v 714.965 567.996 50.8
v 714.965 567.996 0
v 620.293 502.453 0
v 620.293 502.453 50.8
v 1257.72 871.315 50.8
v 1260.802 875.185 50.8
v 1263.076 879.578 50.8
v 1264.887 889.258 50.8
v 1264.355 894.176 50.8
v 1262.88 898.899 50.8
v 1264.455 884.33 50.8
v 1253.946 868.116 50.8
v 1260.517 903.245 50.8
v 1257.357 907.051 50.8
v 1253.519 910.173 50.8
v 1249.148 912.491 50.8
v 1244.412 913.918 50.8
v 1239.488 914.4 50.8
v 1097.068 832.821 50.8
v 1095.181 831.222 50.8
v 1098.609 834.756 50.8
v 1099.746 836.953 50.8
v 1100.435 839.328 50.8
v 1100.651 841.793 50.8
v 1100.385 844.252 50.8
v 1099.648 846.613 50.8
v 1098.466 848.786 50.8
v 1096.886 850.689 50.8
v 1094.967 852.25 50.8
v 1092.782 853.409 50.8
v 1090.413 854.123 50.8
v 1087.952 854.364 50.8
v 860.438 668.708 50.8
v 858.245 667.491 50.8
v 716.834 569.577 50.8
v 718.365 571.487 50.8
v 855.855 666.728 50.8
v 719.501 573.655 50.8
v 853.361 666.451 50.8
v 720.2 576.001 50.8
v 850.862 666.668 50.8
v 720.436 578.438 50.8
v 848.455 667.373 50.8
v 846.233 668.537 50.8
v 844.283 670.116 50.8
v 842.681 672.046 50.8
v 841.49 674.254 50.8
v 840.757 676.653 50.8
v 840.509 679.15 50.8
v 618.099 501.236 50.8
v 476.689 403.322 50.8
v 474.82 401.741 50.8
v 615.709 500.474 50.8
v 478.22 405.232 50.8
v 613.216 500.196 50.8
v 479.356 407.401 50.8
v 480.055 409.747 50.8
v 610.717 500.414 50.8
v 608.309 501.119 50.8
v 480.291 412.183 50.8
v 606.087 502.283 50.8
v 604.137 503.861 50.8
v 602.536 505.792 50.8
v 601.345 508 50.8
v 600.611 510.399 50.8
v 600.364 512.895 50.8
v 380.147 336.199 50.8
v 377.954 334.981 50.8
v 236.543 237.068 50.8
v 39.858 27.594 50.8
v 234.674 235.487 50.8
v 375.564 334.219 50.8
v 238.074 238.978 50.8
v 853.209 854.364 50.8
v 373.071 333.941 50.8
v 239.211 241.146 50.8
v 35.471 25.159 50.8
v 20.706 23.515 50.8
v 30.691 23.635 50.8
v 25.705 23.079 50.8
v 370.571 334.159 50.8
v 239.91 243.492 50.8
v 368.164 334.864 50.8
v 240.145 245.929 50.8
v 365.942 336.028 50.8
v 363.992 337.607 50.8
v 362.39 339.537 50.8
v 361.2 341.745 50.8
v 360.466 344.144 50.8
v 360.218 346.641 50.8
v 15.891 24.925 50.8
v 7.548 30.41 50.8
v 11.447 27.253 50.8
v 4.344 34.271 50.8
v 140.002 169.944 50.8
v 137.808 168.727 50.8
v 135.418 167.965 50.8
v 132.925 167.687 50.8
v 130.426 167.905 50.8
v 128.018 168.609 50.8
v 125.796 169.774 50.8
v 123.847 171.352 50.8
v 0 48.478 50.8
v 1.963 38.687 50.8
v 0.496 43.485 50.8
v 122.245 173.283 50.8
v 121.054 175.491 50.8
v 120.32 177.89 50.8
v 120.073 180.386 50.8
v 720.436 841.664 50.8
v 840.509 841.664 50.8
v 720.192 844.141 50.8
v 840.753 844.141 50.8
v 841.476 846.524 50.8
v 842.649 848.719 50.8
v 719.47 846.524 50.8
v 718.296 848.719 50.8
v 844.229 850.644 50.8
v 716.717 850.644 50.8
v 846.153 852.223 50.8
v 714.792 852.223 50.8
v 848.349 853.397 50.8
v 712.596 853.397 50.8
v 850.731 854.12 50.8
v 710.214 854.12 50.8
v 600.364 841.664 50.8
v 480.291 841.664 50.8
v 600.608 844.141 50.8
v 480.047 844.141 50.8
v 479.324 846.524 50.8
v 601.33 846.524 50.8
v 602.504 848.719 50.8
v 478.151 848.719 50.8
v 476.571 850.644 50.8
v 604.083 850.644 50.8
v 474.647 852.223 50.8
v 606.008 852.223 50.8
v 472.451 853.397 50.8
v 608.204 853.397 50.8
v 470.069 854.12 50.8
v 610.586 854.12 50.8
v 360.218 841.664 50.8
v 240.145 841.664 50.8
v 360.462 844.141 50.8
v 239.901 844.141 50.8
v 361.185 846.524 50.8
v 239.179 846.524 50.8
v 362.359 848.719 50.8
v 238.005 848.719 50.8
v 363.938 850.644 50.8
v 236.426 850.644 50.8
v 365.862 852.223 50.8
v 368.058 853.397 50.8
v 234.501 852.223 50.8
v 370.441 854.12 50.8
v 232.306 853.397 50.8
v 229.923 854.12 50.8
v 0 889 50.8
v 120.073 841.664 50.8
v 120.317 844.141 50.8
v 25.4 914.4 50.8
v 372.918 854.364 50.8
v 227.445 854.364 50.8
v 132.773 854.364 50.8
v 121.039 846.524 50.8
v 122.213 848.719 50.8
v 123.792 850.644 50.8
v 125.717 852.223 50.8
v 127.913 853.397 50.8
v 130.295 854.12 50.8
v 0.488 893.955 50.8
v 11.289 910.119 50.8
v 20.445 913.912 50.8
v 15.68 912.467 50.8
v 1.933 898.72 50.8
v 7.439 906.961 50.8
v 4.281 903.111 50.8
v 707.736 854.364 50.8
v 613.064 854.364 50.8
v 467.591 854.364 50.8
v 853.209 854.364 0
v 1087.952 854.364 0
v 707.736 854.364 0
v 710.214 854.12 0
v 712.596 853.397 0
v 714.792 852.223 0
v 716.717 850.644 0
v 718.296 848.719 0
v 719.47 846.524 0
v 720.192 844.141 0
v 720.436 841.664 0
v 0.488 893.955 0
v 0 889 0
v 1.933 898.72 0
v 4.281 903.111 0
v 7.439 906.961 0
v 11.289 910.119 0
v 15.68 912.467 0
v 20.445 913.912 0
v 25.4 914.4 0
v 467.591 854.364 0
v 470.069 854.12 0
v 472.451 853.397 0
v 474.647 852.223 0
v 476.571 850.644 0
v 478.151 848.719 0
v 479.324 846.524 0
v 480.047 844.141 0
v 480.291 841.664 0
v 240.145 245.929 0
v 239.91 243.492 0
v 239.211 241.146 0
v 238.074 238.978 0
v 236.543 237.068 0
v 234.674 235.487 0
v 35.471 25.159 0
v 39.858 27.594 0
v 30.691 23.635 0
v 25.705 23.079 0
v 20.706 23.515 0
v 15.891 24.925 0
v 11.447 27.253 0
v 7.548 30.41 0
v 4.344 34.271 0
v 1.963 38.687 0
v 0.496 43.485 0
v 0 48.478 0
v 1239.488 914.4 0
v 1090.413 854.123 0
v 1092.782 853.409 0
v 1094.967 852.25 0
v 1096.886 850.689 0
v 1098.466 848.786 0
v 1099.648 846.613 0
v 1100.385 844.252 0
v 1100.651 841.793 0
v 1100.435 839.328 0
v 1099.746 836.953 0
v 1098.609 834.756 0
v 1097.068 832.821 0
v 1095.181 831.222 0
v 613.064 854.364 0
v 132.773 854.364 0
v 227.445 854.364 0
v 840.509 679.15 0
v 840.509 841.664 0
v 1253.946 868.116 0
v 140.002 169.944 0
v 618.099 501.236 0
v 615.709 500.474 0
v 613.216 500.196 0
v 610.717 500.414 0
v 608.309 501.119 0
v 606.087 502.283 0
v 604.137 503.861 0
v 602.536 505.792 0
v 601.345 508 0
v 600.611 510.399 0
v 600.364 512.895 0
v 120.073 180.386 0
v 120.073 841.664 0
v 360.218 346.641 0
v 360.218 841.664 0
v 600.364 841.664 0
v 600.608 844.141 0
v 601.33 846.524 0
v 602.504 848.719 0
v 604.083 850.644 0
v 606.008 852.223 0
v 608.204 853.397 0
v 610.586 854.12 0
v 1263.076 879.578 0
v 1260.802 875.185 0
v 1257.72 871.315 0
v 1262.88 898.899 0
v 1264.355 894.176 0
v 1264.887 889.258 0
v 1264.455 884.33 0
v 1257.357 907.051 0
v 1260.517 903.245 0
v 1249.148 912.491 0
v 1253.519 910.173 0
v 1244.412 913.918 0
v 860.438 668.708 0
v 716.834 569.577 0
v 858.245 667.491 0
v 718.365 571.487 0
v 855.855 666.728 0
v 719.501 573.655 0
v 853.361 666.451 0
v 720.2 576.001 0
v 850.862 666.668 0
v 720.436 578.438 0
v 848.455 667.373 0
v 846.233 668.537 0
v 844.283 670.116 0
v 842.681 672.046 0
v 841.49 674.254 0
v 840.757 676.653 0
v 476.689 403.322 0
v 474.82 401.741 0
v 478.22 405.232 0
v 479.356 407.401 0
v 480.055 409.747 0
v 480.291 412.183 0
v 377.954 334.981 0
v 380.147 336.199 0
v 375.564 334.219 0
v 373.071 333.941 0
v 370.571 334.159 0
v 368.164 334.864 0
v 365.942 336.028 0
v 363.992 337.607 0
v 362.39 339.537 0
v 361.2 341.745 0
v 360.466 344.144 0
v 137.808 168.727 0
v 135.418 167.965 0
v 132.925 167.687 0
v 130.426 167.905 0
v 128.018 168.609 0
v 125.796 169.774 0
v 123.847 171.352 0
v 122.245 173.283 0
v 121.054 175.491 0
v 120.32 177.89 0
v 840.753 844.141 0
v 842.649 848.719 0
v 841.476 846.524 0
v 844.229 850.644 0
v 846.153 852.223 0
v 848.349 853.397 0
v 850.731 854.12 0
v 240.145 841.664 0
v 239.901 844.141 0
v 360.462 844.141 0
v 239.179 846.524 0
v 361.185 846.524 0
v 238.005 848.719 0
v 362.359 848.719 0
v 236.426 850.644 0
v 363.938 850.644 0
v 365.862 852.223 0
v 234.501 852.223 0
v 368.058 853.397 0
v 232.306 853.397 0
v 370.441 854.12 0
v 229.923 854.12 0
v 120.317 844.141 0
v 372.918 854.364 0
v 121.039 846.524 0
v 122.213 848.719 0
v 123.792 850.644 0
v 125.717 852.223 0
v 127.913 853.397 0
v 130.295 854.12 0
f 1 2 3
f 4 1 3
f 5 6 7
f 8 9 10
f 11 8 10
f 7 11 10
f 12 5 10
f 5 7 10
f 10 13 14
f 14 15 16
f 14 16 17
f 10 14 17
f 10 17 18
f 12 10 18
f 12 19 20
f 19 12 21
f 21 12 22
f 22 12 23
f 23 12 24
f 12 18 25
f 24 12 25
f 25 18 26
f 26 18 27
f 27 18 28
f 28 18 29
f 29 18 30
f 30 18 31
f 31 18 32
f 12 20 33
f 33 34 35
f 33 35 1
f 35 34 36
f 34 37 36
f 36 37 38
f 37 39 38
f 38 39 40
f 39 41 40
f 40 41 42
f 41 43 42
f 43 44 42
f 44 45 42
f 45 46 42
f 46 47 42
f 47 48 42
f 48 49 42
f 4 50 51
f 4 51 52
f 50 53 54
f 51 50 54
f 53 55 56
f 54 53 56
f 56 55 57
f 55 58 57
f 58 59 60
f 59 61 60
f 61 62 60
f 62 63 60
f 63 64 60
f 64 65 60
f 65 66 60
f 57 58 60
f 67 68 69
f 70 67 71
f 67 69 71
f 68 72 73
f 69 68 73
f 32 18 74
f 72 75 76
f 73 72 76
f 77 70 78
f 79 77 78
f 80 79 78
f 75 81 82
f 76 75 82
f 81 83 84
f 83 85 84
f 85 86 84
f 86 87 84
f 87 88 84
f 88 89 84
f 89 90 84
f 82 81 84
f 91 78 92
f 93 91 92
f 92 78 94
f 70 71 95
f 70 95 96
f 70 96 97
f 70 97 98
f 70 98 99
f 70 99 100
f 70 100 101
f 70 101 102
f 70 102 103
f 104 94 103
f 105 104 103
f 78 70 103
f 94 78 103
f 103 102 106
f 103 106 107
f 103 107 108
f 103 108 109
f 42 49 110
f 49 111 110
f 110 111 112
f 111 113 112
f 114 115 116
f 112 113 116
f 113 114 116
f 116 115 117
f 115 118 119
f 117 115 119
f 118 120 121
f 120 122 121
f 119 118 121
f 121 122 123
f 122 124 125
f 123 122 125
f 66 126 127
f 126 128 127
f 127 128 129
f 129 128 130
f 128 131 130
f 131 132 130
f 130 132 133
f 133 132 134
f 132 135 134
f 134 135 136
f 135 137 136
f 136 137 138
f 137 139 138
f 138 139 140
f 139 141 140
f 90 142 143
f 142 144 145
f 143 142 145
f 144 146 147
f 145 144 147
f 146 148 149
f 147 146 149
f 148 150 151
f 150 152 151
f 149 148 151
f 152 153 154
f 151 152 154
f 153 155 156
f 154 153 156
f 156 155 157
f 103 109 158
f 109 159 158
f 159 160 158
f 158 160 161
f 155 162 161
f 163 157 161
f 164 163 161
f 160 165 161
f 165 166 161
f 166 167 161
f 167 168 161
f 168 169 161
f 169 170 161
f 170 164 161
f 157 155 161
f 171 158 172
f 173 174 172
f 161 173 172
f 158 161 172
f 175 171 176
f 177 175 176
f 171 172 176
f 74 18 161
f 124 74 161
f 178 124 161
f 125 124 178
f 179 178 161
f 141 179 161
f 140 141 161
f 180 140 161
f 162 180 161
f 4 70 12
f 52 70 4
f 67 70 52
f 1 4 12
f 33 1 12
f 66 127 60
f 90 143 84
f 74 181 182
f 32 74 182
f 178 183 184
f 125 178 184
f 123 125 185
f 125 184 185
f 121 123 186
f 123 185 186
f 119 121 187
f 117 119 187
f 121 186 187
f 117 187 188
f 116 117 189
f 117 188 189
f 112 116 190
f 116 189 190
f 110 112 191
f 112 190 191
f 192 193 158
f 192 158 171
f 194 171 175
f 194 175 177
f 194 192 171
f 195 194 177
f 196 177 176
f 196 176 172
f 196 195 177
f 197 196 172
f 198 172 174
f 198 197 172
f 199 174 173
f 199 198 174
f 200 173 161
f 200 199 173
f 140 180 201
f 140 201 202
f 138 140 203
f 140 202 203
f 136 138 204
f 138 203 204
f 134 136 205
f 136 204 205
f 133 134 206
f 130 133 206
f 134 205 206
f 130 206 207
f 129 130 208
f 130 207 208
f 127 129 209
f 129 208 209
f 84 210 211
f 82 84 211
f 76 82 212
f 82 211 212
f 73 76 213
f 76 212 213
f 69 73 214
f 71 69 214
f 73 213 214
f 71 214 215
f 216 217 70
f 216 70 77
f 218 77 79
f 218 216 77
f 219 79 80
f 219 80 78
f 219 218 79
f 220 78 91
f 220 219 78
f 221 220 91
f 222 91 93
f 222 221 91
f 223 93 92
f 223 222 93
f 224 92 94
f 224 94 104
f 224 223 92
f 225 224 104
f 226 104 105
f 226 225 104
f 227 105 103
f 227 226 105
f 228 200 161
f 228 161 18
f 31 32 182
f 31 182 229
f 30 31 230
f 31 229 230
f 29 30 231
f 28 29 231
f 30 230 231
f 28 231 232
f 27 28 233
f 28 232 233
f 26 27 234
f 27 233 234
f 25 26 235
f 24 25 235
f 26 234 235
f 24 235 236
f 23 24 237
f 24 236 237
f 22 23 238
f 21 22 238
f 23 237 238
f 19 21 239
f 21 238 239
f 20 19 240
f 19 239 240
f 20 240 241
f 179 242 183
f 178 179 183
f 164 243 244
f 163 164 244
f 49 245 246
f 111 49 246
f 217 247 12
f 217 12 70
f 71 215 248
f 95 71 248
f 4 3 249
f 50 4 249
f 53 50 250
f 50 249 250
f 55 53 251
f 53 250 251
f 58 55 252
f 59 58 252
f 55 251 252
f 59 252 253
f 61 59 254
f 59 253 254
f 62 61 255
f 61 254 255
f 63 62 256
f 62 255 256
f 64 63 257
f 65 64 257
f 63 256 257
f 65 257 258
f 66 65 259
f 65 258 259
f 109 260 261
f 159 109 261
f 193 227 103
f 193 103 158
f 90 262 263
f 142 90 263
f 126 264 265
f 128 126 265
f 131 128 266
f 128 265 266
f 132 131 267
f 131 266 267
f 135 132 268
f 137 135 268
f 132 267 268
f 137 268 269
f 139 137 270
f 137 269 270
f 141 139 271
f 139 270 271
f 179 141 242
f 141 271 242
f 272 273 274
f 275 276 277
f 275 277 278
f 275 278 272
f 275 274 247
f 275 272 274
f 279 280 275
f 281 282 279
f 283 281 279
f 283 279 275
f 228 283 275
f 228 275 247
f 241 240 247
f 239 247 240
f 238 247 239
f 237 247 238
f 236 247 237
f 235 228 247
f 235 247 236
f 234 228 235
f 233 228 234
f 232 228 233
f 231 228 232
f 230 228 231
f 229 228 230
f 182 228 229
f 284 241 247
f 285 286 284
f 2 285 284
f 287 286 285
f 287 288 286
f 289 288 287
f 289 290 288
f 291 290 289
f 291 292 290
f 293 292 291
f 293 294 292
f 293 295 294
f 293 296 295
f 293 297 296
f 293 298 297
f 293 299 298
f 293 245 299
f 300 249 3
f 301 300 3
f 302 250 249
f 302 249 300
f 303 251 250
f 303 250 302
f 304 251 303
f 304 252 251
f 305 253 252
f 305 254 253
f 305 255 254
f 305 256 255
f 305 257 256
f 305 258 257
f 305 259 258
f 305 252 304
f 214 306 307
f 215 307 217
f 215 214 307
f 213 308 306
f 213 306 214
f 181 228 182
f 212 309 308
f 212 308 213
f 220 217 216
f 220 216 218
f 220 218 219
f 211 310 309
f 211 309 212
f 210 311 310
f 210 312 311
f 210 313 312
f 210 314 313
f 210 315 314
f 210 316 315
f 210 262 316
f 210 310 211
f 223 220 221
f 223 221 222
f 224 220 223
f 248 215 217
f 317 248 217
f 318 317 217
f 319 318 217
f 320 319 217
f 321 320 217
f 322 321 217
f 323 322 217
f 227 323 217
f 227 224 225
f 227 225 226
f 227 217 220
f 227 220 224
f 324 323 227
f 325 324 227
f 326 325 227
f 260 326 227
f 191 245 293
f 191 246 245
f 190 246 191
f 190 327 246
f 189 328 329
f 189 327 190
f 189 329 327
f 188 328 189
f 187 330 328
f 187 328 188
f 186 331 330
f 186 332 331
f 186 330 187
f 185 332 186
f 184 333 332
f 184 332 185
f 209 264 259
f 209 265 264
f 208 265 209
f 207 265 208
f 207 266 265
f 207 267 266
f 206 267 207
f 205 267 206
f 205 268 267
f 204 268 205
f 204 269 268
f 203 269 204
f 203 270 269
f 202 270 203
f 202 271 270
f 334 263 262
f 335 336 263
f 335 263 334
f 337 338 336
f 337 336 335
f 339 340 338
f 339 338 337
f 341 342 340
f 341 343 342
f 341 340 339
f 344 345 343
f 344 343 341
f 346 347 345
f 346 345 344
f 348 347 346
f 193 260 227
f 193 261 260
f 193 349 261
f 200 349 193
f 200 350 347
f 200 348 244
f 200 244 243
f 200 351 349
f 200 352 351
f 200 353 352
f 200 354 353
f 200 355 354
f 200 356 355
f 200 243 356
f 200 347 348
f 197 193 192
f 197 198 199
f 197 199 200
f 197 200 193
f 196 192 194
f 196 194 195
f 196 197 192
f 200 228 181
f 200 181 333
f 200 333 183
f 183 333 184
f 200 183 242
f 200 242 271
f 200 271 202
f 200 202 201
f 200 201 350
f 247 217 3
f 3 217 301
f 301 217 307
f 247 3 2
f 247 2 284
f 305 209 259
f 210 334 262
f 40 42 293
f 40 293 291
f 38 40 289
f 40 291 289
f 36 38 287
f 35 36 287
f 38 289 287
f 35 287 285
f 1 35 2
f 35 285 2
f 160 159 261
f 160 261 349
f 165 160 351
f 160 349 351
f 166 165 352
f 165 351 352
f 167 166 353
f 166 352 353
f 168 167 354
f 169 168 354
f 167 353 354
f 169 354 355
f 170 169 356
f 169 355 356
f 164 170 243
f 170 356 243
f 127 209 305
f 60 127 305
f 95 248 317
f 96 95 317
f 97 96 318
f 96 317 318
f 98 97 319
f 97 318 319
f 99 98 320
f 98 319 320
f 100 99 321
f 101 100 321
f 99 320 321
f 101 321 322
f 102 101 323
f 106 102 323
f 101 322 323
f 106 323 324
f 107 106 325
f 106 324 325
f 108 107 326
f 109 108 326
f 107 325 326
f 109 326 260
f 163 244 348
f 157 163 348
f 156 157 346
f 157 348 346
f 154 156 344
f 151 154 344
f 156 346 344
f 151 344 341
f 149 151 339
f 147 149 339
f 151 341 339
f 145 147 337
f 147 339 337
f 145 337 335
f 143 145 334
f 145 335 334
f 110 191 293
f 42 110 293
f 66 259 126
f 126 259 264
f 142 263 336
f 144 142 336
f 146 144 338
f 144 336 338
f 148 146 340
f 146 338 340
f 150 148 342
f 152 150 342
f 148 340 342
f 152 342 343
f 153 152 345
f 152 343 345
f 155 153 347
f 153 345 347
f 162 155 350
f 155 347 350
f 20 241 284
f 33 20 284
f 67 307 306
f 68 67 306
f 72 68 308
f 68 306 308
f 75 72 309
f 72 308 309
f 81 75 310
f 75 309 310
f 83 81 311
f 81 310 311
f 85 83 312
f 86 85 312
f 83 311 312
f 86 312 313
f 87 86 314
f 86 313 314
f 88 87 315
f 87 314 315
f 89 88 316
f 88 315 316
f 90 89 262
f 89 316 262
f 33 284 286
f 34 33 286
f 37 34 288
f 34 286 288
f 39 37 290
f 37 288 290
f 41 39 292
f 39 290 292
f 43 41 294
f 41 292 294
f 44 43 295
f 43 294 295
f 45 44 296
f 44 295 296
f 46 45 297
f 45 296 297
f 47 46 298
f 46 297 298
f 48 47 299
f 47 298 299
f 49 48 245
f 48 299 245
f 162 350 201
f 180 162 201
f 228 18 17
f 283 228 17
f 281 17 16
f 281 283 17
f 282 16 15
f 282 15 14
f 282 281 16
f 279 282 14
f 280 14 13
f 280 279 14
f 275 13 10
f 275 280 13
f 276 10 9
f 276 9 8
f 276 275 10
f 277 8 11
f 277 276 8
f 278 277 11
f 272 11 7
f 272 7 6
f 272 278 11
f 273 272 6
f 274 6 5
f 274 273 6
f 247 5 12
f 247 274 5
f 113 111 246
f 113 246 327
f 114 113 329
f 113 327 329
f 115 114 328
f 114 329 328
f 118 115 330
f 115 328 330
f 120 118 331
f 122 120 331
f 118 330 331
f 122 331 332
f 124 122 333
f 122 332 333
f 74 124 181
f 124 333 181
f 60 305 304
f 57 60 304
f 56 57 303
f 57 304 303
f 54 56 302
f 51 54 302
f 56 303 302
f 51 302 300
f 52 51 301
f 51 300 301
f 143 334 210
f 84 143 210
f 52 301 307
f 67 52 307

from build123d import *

# Parameters (mm, degrees)
BOSS_EXTRUDE2_DEPTH = 50.8


with BuildPart() as part:
    # Sketch1 → Boss-Extrude2 (new body)
    with BuildSketch(Plane.XY):
        with BuildLine():
            Line((0, 48.477635603), (0, 889))
            ThreePointArc((0, 889), (7.439487758, 906.960512242), (25.4, 914.4))
            Line((25.4, 914.4), (1239.487859684, 914.4))
            ThreePointArc((1239.487859684, 914.4), (1263.732503571, 896.573456464), (1253.945793147, 868.116318332))
            Line((1253.945793147, 868.116318332), (39.857933462, 27.593953935))
            ThreePointArc((39.857933462, 27.593953935), (13.611690324, 25.978841081), (0, 48.477635603))
        make_face()
        with BuildLine():
            Line((120.072727273, 180.3859565), (120.072727273, 841.663636364))
            ThreePointArc((120.072727273, 841.663636364), (123.792471152, 850.643892485), (132.772727273, 854.363636364))
            Line((132.772727273, 854.363636364), (227.445454545, 854.363636364))
            ThreePointArc((227.445454545, 854.363636364), (236.425710667, 850.643892485), (240.145454545, 841.663636364))
            Line((240.145454545, 841.663636364), (240.145454545, 245.928613843))
            ThreePointArc((240.145454545, 245.928613843), (238.694851807, 240.034459004), (234.674421277, 235.486773009))
            Line((234.674421277, 235.486773009), (140.001694004, 169.944115666))
            ThreePointArc((140.001694004, 169.944115666), (126.878572434, 169.136559239), (120.072727273, 180.3859565))
        make_face(mode=Mode.SUBTRACT)
        with BuildLine():
            Line((360.218181818, 346.640501955), (360.218181818, 841.663636364))
            ThreePointArc((360.218181818, 841.663636364), (363.937925697, 850.643892485), (372.918181818, 854.363636364))
            Line((372.918181818, 854.363636364), (467.590909091, 854.363636364))
            ThreePointArc((467.590909091, 854.363636364), (476.571165212, 850.643892485), (480.290909091, 841.663636364))
            Line((480.290909091, 841.663636364), (480.290909091, 412.183159297))
            ThreePointArc((480.290909091, 412.183159297), (478.840306352, 406.289004459), (474.819875822, 401.741318463))
            Line((474.819875822, 401.741318463), (380.147148549, 336.198661121))
            ThreePointArc((380.147148549, 336.198661121), (367.02402698, 335.391104693), (360.218181818, 346.640501955))
        make_face(mode=Mode.SUBTRACT)
        with BuildLine():
            Line((600.363636364, 512.895047409), (600.363636364, 841.663636364))
            ThreePointArc((600.363636364, 841.663636364), (604.083380243, 850.643892485), (613.063636364, 854.363636364))
            Line((613.063636364, 854.363636364), (707.736363636, 854.363636364))
            ThreePointArc((707.736363636, 854.363636364), (716.716619757, 850.643892485), (720.436363636, 841.663636364))
            Line((720.436363636, 841.663636364), (720.436363636, 578.437704752))
            ThreePointArc((720.436363636, 578.437704752), (718.985760898, 572.543549914), (714.965330368, 567.995863918))
            Line((714.965330368, 567.995863918), (620.292603095, 502.453206575))
            ThreePointArc((620.292603095, 502.453206575), (607.169481525, 501.645650148), (600.363636364, 512.895047409))
        make_face(mode=Mode.SUBTRACT)
        with BuildLine():
            Line((840.509090909, 679.149592864), (840.509090909, 841.663636364))
            ThreePointArc((840.509090909, 841.663636364), (844.228834788, 850.643892485), (853.209090909, 854.363636364))
            Line((853.209090909, 854.363636364), (1087.951598187, 854.363636364))
            ThreePointArc((1087.951598187, 854.363636364), (1100.07392013, 845.450364596), (1095.180564918, 831.22179553))
            Line((1095.180564918, 831.22179553), (860.43805764, 668.70775203))
            ThreePointArc((860.43805764, 668.70775203), (847.314936071, 667.900195602), (840.509090909, 679.149592864))
        make_face(mode=Mode.SUBTRACT)
    extrude(amount=BOSS_EXTRUDE2_DEPTH)


solid = part.part
